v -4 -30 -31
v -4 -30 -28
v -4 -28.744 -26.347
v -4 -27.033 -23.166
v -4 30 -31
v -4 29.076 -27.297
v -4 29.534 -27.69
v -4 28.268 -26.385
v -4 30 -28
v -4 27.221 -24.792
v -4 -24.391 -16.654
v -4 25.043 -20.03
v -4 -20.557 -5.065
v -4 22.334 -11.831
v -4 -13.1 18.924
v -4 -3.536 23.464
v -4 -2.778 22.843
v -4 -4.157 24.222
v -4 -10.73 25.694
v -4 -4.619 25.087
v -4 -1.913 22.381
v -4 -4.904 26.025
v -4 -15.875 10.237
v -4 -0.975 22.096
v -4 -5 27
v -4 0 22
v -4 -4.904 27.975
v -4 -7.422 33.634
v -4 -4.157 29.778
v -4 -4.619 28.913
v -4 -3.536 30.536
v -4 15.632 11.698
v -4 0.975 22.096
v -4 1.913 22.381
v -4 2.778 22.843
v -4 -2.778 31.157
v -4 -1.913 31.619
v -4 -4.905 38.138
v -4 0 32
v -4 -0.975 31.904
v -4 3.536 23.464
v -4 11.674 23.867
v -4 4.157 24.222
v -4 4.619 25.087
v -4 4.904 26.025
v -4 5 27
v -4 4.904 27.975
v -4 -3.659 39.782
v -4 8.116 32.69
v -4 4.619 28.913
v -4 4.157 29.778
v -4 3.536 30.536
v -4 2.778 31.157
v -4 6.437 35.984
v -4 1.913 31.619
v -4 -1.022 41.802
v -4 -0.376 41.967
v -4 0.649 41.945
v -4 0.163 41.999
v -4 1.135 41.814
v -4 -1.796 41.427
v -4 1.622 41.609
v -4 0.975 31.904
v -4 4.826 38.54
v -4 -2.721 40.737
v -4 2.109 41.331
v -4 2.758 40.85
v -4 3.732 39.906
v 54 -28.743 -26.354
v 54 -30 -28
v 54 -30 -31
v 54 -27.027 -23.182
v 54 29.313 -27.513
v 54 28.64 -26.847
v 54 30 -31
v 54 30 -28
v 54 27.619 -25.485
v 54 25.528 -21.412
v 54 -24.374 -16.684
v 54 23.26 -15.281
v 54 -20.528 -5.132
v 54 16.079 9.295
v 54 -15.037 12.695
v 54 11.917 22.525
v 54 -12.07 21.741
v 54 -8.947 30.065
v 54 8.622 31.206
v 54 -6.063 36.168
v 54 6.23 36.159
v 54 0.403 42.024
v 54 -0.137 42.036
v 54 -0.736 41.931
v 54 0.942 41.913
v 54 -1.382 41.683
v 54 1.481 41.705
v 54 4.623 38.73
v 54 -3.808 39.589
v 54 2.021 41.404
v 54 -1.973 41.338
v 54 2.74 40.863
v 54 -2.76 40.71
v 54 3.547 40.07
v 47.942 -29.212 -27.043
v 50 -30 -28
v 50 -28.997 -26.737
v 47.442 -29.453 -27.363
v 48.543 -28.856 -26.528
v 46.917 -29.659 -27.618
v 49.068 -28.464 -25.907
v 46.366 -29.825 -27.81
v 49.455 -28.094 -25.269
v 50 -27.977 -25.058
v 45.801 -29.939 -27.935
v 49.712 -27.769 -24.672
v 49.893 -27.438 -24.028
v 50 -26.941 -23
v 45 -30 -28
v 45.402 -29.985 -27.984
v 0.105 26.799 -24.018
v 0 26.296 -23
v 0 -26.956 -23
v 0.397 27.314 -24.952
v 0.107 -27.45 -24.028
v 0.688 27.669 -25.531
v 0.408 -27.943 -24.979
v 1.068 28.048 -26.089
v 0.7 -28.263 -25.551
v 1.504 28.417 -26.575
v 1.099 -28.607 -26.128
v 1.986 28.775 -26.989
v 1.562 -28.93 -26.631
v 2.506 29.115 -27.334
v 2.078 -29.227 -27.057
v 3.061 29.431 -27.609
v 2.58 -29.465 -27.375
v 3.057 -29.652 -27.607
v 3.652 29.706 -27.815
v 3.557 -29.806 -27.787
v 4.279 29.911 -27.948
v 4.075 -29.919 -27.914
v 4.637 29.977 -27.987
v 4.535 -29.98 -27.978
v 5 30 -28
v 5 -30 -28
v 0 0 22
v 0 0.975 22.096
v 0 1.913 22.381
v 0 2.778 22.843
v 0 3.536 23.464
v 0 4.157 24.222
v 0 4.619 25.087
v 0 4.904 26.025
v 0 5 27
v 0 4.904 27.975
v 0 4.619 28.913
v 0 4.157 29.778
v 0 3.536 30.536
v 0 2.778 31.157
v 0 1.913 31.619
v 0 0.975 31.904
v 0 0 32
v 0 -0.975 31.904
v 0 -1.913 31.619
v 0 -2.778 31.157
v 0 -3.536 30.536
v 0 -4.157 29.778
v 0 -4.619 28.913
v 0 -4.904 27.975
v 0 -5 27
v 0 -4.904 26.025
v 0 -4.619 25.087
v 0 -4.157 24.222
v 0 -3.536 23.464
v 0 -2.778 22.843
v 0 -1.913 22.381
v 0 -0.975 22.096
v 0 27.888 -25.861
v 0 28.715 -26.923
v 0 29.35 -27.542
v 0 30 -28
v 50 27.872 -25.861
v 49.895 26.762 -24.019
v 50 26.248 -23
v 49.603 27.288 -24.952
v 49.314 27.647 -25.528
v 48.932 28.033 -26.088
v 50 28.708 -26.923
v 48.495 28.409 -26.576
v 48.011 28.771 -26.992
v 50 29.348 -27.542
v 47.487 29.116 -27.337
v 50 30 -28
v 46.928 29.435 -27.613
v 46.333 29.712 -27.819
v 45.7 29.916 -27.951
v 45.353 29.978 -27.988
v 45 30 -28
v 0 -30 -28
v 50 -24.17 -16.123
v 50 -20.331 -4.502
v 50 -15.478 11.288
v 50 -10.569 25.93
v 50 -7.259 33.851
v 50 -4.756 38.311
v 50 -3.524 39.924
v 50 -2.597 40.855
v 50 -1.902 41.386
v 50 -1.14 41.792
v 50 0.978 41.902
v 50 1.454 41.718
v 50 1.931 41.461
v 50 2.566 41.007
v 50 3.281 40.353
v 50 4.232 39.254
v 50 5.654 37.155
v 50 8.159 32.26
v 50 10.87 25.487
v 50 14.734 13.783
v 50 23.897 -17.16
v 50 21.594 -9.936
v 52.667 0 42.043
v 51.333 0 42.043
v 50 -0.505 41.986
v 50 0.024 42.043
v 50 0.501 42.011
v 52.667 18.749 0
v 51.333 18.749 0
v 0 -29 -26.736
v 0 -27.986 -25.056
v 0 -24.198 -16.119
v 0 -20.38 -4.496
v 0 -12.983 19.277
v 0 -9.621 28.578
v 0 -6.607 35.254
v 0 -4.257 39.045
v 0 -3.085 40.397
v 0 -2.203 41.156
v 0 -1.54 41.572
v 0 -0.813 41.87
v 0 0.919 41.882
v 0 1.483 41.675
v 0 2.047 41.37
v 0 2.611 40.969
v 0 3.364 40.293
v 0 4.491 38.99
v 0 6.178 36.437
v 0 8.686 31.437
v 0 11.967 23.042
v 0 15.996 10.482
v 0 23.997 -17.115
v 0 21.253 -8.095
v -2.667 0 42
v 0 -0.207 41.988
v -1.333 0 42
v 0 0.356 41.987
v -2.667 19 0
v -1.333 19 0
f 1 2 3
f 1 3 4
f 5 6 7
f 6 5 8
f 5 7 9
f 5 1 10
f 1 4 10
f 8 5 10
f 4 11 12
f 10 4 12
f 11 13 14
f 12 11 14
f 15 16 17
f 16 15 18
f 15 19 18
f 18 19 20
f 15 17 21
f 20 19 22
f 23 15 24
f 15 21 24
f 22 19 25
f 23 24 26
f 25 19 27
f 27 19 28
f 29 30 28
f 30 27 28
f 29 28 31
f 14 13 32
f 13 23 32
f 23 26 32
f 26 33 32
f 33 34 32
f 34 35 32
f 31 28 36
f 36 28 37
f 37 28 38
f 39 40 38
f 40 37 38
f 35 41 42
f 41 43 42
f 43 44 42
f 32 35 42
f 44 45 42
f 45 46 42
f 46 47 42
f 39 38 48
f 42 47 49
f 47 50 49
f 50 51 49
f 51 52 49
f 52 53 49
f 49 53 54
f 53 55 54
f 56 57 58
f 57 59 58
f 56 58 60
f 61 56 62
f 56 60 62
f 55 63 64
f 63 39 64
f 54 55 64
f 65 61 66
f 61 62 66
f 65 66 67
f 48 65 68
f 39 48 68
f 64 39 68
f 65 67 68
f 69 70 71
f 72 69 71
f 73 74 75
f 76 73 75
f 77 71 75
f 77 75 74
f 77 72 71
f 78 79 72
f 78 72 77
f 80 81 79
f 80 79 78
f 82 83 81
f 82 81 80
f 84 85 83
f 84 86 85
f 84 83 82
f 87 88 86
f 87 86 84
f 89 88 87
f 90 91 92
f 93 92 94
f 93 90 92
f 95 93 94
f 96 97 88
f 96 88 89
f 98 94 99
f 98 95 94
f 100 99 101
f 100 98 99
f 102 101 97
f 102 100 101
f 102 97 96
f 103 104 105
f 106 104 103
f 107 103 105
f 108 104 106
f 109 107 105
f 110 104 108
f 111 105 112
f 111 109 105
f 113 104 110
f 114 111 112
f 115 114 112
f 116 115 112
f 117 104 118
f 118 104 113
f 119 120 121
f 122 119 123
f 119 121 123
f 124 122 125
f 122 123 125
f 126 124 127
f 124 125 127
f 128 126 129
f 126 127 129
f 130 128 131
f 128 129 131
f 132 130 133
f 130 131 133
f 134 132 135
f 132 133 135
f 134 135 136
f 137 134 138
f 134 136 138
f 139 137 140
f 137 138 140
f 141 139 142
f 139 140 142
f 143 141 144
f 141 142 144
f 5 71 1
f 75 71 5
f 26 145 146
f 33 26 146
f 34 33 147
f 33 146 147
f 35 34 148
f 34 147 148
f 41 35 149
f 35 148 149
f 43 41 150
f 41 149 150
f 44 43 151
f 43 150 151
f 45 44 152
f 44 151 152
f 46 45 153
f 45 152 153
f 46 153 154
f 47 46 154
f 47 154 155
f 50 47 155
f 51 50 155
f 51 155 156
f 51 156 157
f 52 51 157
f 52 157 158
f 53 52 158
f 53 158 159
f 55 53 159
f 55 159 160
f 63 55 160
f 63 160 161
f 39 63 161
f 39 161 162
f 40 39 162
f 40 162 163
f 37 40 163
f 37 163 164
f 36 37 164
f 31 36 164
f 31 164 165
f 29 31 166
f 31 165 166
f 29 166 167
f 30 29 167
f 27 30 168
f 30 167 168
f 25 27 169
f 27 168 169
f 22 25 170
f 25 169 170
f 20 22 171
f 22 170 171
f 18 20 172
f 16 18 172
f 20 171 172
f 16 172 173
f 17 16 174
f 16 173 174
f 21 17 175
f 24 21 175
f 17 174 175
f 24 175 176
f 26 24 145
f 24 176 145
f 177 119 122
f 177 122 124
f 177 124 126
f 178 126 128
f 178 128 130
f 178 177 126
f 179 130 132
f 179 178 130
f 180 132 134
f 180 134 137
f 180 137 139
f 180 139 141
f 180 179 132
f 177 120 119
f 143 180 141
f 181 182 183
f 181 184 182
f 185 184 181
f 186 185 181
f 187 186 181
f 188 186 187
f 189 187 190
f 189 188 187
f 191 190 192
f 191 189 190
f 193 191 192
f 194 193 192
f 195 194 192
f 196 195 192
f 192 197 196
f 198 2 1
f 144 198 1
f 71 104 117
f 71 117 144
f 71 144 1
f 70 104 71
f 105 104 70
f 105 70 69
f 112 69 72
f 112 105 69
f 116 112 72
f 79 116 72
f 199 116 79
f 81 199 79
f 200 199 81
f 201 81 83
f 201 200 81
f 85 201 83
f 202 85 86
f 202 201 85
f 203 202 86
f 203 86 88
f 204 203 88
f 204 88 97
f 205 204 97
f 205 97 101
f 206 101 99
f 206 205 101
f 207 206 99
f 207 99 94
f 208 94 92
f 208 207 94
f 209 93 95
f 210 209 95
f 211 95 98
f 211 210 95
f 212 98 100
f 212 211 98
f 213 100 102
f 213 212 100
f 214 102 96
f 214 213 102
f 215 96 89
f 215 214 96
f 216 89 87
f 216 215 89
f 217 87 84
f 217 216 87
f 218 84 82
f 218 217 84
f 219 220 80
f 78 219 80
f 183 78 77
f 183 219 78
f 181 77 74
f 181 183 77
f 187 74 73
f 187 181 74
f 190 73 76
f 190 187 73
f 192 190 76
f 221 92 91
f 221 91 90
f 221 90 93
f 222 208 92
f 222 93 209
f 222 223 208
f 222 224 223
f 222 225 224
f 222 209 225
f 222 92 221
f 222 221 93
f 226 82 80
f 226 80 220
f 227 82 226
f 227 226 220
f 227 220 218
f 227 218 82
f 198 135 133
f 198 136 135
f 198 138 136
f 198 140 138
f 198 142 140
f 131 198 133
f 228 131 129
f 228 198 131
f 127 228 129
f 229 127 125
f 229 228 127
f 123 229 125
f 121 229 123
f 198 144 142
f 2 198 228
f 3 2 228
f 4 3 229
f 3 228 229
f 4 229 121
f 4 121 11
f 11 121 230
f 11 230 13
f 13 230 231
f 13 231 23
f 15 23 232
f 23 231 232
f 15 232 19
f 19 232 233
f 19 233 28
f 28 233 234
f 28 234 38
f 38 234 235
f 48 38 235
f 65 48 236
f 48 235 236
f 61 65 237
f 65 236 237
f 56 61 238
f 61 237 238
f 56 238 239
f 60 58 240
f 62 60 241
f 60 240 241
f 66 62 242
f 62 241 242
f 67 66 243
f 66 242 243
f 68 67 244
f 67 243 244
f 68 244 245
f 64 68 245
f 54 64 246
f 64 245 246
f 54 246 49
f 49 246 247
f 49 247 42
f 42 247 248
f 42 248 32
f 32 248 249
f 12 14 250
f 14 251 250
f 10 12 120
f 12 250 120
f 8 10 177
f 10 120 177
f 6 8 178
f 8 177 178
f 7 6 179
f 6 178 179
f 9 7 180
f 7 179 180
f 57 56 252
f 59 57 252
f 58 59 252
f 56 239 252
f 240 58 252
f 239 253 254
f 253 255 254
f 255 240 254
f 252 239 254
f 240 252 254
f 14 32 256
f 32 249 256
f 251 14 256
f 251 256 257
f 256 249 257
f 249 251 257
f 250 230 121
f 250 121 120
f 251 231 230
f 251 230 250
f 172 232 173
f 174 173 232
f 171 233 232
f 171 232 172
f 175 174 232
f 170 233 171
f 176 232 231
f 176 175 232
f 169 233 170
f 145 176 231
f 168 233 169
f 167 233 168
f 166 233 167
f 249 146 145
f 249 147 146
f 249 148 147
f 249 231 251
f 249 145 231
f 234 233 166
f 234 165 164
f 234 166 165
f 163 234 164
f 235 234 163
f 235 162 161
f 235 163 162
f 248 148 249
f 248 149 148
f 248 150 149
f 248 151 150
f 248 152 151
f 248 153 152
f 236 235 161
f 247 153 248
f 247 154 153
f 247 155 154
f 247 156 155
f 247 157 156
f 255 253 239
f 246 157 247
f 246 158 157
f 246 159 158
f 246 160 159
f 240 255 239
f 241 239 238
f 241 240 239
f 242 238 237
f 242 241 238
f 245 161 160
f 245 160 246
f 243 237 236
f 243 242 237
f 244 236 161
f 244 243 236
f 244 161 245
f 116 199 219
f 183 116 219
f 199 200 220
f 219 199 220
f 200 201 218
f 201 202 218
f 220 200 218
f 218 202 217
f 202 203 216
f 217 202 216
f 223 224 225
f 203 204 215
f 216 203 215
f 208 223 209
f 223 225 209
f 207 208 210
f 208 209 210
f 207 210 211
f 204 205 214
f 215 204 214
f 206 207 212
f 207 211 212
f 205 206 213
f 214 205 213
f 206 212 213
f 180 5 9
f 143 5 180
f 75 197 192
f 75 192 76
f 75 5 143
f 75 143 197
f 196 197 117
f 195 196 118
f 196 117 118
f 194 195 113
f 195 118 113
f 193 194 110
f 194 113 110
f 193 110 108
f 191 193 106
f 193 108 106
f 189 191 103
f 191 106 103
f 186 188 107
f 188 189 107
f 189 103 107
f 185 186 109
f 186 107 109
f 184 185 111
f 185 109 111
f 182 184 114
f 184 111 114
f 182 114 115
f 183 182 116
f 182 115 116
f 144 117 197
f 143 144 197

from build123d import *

# Parameters (mm, degrees)
BOSS_EXTRUDE1_DEPTH = 4
BOSS_EXTRUDE2_DEPTH = 4
SKETCH7_W           = 60
SKETCH7_H           = 58
BOSS_EXTRUDE3_DEPTH = 3
FILLET2_START       = -30.000000115
FILLET2_DEPTH       = 60.000000115
FILLET2_2_DEPTH     = 50
FILLET2_START_2     = 44.9999999
FILLET2_3_DEPTH     = 5.0000001
SKETCH2_4_R         = 5
CUT_EXTRUDE1_DEPTH  = 5


with BuildPart() as part:
    # Sketch6 → Boss-Extrude1 (new body)
    with BuildSketch(Plane.YZ.offset(50)):
        with BuildLine():
            Line((-30, -28), (30, -28))
            add(Edge.make_bspline(
                [(-30, -28), (-21.341162822, -18.933637736), (-4.314034272, 78.522274038), (17.303381943, 5.877471269), (25.855908326, -25.643416869), (30, -28)],
                knots=[0, 0, 0, 0, 0.428019727, 0.687018033, 0.856039454, 0.856039454, 0.856039454, 0.856039454], degree=3))
        make_face()
    extrude(amount=BOSS_EXTRUDE1_DEPTH)



with BuildPart() as body_2:
    # Sketch2 → Boss-Extrude2 (new body)
    with BuildSketch(Plane.YZ):
        with BuildLine():
            Line((-30, -28), (30, -28))
            add(Edge.make_bspline(
                [(-30, -28), (-21.357866352, -18.89790242), (-4.588676367, 78.427600294), (17.792657751, 5.890750685), (25.855908326, -25.643416869), (30, -28)],
                knots=[0, 0, 0, 0, 0.428019727, 0.687018033, 0.856039454, 0.856039454, 0.856039454, 0.856039454], degree=3))
        make_face()
    extrude(amount=-BOSS_EXTRUDE2_DEPTH)


with BuildPart() as part_1:
    add(part.part)

    add(body_2.part)  # Boss-Extrude3 merges body 2
    # Sketch7 → Boss-Extrude3 (add)
    with BuildSketch(Plane.YX.offset(28)):
        with Locations((0, 25)):
            Rectangle(SKETCH7_W, SKETCH7_H)
    extrude(amount=BOSS_EXTRUDE3_DEPTH)

    # Fillet2: read off the stored shape, not the designer's step
    # Fillet2 outline → Fillet2 (add)
    with BuildSketch(Plane(origin=(0, 0, 0), x_dir=(1, 0, 0), z_dir=(0, 1, 0)).offset(FILLET2_START)):
        with BuildLine():
            Line((50, 28), (45, 28))
            ThreePointArc((45, 28), (48.535533906, 26.535533906), (50, 23))
            Line((50, 23), (50, 28))
        make_face()
        with BuildLine():
            ThreePointArc((0, 23), (1.464466094, 26.535533906), (5, 28))
            Line((5, 28), (0, 28))
            Line((0, 28), (0, 23))
        make_face()
    extrude(amount=FILLET2_DEPTH)

    # Fillet2 2 outline → Fillet2 2 (cut)
    with BuildSketch(Plane.YZ):
        with BuildLine():
            Line((-26.955658307, -23), (-30.000000115, -23))
            Line((-30.000000115, -23), (-30, -28))
            add(Edge.make_bspline(
                [(-30, -28), (-29.008314276, -26.955533367), (-27.992857706, -25.232504786), (-26.955658307, -23)],
                knots=[0, 0, 0, 0, 0.049115308, 0.049115308, 0.049115308, 0.049115308], degree=3))
        make_face()
        with BuildLine():
            add(Edge.make_bspline(
                [(26.295963783, -23), (27.464737595, -25.485053142), (28.683961451, -27.251620261), (30, -28)],
                knots=[0.802363347, 0.802363347, 0.802363347, 0.802363347, 0.856039454, 0.856039454, 0.856039454, 0.856039454], degree=3))
            Line((30, -28), (30, -23))
            Line((30, -23), (26.295963783, -23))
        make_face()
    extrude(amount=FILLET2_2_DEPTH, mode=Mode.SUBTRACT)

    # Fillet2 3 outline → Fillet2 3 (cut)
    with BuildSketch(Plane.YZ.offset(FILLET2_START_2)):
        with BuildLine():
            add(Edge.make_bspline(
                [(-30, -28), (-29.008314276, -26.955533367), (-27.992857706, -25.232504786), (-26.955658307, -23)],
                knots=[0, 0, 0, 0, 0.049115308, 0.049115308, 0.049115308, 0.049115308], degree=3))
            add(Edge.make_bspline(
                [(-30, -28), (-29.005212581, -26.958393265), (-27.984696993, -25.23506108), (-26.941219534, -23)],
                knots=[0, 0, 0, 0, 0.049173882, 0.049173882, 0.049173882, 0.049173882], degree=3))
            Line((-26.941219534, -23), (-26.955658307, -23))
        make_face()
        with BuildLine():
            Line((26.295963783, -23), (26.247524945, -23))
            add(Edge.make_bspline(
                [(26.247524945, -23), (27.444892295, -25.485068916), (28.683770288, -27.251511554), (30, -28)],
                knots=[0.802355551, 0.802355551, 0.802355551, 0.802355551, 0.856039454, 0.856039454, 0.856039454, 0.856039454], degree=3))
            add(Edge.make_bspline(
                [(26.295963783, -23), (27.464737595, -25.485053142), (28.683961451, -27.251620261), (30, -28)],
                knots=[0.802363347, 0.802363347, 0.802363347, 0.802363347, 0.856039454, 0.856039454, 0.856039454, 0.856039454], degree=3))
        make_face()
    extrude(amount=FILLET2_3_DEPTH, mode=Mode.SUBTRACT)

    # Sketch2<4> → Cut-Extrude1 (cut)
    with BuildSketch(Plane.YZ):
        with Locations(Location((-1.9074e-05, 27, 0), (0, 0, 270))):
            Circle(SKETCH2_4_R)
    extrude(amount=-CUT_EXTRUDE1_DEPTH, mode=Mode.SUBTRACT)


solid = part_1.part
